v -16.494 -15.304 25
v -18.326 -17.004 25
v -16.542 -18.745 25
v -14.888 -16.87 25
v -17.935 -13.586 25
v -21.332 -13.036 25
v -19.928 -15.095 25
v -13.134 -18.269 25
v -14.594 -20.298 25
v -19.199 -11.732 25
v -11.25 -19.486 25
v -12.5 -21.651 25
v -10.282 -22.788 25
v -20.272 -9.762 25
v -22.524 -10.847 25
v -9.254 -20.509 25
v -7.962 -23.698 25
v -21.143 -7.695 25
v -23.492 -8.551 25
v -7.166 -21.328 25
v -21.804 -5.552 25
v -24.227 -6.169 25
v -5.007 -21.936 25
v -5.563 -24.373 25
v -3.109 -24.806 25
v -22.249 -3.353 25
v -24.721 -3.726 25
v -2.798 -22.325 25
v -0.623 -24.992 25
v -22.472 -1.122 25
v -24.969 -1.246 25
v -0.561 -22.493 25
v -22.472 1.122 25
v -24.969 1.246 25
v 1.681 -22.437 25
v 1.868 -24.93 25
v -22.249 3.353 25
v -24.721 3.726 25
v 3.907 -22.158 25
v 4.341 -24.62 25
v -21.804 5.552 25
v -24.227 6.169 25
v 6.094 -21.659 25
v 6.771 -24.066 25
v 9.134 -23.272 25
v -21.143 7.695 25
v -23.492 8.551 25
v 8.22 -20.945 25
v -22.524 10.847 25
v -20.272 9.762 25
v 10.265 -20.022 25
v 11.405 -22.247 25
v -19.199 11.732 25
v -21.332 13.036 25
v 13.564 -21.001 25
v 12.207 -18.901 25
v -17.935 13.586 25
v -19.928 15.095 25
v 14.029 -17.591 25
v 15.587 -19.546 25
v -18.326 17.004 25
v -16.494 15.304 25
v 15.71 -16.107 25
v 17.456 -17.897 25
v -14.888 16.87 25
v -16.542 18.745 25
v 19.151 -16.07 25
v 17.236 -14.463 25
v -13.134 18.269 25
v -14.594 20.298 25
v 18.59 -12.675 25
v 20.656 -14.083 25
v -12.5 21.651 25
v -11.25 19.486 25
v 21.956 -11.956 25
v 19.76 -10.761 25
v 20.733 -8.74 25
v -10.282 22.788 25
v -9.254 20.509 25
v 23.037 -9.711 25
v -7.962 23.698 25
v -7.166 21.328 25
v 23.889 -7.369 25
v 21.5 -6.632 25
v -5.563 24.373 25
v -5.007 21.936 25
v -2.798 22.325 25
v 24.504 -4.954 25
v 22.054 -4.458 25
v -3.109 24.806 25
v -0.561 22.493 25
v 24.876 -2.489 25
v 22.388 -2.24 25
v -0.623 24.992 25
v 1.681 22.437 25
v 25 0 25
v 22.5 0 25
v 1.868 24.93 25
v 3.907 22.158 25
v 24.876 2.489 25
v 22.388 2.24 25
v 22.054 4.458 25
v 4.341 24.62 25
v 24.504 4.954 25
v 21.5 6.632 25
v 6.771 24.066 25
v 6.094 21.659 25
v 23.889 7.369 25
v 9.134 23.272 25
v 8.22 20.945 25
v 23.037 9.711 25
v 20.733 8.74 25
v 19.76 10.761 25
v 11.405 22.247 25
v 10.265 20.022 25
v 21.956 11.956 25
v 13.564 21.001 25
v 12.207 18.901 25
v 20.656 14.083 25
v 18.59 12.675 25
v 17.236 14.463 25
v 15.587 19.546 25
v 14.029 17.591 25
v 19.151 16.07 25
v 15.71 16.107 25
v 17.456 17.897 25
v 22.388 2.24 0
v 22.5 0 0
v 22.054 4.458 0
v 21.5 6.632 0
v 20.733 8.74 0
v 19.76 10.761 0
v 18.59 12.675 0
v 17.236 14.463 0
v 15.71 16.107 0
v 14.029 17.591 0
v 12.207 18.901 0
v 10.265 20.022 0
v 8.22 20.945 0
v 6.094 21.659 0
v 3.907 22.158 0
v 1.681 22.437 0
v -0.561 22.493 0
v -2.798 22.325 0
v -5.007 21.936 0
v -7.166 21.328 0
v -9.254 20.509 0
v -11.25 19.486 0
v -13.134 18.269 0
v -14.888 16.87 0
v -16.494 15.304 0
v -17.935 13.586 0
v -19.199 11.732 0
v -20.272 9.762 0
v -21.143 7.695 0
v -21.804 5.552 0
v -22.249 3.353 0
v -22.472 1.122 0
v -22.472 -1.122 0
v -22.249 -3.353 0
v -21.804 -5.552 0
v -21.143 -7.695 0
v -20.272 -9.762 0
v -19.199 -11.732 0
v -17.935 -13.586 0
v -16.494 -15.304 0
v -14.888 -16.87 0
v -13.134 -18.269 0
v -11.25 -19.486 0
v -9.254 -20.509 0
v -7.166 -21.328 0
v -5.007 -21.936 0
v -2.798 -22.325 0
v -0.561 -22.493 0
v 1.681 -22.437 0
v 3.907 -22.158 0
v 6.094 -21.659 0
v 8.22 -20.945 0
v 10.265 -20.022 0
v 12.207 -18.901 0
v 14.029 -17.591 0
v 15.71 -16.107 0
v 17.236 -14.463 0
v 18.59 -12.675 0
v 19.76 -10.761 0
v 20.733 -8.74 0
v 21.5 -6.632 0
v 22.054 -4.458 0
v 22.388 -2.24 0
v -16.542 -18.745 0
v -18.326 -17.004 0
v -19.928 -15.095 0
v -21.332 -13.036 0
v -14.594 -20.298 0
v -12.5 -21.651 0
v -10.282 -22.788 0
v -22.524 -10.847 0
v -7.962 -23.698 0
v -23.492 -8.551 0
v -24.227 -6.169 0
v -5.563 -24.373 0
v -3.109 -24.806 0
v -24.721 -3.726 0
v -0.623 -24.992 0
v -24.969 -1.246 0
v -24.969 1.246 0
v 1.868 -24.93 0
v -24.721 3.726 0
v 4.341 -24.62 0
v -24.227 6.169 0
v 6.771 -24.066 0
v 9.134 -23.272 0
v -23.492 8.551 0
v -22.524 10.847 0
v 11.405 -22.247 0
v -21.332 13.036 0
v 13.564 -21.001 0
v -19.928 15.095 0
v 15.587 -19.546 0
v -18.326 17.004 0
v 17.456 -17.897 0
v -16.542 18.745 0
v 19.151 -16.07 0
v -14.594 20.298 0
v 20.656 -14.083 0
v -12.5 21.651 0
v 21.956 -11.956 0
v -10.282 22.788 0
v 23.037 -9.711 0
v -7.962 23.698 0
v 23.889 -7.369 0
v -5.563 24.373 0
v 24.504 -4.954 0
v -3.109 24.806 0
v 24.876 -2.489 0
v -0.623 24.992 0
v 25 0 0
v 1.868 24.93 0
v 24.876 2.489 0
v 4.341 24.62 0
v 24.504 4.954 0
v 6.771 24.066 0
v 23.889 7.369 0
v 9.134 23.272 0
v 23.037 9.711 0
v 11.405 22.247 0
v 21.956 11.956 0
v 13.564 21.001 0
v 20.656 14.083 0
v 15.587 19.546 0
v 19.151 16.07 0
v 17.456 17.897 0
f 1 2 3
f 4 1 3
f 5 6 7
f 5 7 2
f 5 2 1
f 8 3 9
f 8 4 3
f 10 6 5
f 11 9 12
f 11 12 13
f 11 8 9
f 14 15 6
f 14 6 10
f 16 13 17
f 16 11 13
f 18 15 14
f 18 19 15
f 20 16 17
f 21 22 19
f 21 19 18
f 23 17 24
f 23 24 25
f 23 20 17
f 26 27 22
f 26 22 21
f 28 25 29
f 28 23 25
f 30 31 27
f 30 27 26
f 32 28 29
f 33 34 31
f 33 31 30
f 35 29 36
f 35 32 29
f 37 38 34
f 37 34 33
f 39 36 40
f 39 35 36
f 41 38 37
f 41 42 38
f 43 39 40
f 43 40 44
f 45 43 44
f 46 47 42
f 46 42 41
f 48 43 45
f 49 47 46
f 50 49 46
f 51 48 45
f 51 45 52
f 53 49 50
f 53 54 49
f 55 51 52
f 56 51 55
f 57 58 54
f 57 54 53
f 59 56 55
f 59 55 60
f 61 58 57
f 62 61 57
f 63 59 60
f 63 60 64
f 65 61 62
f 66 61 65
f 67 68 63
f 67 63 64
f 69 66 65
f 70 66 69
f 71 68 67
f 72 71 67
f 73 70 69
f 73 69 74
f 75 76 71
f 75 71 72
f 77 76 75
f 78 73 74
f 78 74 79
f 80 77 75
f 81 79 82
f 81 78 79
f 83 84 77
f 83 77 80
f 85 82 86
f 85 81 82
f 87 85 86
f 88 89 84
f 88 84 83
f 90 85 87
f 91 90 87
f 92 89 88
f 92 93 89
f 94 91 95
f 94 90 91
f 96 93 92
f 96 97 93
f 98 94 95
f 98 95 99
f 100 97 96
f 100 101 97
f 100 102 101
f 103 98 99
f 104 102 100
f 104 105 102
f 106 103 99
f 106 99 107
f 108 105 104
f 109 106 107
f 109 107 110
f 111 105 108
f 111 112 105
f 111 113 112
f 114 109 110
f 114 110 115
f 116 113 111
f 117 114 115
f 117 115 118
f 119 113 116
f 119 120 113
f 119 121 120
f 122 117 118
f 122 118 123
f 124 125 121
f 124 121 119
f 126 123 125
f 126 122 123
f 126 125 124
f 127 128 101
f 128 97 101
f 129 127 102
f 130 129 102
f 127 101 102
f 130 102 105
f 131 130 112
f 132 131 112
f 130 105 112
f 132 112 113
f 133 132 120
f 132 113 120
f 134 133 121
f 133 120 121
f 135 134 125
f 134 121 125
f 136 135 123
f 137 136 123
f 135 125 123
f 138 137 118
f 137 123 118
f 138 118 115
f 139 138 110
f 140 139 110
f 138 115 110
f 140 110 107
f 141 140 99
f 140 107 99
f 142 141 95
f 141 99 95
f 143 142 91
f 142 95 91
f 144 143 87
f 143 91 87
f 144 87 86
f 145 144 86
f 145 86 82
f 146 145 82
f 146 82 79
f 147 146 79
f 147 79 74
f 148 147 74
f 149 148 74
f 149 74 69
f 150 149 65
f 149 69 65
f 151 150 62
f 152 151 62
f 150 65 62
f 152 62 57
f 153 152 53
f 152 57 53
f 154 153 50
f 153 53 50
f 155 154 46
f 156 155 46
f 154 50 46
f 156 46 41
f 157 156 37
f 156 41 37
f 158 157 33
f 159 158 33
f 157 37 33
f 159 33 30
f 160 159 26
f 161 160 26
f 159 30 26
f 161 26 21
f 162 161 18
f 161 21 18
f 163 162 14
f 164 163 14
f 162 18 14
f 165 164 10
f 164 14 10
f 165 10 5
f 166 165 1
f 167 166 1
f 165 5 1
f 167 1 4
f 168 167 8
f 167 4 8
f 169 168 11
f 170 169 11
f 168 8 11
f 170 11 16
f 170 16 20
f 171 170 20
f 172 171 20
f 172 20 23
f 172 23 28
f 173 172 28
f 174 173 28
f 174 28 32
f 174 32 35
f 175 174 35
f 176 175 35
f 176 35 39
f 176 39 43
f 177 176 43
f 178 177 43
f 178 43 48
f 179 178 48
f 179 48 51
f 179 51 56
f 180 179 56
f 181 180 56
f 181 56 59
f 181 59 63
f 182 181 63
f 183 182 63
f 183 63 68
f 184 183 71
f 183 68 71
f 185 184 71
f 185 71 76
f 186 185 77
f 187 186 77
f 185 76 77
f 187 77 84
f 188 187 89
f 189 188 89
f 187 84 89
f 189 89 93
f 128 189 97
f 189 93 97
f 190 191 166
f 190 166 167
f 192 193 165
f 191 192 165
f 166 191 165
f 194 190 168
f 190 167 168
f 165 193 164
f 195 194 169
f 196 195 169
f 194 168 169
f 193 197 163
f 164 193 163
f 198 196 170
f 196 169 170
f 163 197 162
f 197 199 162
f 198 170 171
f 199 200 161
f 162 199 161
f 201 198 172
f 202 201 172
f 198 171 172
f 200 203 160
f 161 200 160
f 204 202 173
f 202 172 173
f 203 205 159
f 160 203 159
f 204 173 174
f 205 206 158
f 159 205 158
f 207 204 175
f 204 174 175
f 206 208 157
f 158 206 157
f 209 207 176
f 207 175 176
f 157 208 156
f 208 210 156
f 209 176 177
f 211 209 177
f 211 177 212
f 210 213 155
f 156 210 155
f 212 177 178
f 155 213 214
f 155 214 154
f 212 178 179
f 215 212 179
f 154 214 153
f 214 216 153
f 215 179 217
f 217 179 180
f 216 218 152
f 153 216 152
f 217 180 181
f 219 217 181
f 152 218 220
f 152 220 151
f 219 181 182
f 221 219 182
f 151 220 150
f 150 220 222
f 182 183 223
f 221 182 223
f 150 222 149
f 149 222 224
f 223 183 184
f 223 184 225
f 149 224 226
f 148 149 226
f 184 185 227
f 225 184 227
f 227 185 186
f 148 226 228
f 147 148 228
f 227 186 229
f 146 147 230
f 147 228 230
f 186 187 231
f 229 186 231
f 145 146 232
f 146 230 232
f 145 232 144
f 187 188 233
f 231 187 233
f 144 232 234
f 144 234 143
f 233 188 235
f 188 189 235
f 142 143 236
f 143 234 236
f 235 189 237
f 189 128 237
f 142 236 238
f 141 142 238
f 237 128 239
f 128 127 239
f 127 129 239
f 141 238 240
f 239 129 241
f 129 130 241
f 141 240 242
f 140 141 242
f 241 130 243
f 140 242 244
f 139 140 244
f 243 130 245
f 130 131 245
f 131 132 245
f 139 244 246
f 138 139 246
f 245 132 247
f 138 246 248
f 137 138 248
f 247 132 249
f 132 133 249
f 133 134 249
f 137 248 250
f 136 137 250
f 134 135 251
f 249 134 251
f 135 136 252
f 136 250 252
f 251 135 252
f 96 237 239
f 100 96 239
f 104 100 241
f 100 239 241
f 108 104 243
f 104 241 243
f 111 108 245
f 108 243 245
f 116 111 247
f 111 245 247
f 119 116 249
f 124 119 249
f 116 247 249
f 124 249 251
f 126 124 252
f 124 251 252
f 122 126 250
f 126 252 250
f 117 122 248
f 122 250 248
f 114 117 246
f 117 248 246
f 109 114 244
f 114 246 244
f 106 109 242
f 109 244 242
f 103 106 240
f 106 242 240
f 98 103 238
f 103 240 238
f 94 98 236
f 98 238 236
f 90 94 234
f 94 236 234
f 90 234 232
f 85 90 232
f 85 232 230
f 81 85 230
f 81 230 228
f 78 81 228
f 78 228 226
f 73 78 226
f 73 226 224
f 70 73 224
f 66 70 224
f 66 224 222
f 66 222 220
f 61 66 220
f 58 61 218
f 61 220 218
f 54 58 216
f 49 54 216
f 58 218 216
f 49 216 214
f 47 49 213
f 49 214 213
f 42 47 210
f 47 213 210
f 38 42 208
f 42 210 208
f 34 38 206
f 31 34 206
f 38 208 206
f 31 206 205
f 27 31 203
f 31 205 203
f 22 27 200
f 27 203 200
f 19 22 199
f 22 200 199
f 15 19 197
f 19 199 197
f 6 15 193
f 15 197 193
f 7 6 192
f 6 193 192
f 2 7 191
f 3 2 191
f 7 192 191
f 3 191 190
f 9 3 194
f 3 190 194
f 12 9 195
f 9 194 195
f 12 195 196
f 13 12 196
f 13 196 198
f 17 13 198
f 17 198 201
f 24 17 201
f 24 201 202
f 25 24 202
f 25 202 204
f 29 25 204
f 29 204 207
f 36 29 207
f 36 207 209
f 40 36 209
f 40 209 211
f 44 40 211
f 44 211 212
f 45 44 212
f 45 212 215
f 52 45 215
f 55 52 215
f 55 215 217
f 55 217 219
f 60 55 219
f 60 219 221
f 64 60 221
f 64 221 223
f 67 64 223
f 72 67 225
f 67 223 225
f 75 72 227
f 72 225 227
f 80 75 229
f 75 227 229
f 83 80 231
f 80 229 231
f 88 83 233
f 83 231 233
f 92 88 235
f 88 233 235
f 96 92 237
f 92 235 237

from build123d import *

# Parameters (mm, degrees)
F0_R     = 25
F1_DEPTH = 25
F2_T     = -2.5
F3_R     = 22.5
F4_DEPTH = 2.5


with BuildPart() as f1:
    # F0 (on Top) → F1 (new body)
    with BuildSketch(Plane.XY):
        Circle(F0_R)
    extrude(amount=F1_DEPTH)

    # F2
    f2_openings = [f1.faces().sort_by_distance(p)[0] for p in [
        (0, 0, 25),
    ]]
    offset(amount=F2_T, openings=f2_openings)

    # F3 (on face) → F4 (cut)
    with BuildSketch(Plane.XY.offset(2.5)):
        Circle(F3_R)
    extrude(amount=-F4_DEPTH, mode=Mode.SUBTRACT)


solid = f1.part
